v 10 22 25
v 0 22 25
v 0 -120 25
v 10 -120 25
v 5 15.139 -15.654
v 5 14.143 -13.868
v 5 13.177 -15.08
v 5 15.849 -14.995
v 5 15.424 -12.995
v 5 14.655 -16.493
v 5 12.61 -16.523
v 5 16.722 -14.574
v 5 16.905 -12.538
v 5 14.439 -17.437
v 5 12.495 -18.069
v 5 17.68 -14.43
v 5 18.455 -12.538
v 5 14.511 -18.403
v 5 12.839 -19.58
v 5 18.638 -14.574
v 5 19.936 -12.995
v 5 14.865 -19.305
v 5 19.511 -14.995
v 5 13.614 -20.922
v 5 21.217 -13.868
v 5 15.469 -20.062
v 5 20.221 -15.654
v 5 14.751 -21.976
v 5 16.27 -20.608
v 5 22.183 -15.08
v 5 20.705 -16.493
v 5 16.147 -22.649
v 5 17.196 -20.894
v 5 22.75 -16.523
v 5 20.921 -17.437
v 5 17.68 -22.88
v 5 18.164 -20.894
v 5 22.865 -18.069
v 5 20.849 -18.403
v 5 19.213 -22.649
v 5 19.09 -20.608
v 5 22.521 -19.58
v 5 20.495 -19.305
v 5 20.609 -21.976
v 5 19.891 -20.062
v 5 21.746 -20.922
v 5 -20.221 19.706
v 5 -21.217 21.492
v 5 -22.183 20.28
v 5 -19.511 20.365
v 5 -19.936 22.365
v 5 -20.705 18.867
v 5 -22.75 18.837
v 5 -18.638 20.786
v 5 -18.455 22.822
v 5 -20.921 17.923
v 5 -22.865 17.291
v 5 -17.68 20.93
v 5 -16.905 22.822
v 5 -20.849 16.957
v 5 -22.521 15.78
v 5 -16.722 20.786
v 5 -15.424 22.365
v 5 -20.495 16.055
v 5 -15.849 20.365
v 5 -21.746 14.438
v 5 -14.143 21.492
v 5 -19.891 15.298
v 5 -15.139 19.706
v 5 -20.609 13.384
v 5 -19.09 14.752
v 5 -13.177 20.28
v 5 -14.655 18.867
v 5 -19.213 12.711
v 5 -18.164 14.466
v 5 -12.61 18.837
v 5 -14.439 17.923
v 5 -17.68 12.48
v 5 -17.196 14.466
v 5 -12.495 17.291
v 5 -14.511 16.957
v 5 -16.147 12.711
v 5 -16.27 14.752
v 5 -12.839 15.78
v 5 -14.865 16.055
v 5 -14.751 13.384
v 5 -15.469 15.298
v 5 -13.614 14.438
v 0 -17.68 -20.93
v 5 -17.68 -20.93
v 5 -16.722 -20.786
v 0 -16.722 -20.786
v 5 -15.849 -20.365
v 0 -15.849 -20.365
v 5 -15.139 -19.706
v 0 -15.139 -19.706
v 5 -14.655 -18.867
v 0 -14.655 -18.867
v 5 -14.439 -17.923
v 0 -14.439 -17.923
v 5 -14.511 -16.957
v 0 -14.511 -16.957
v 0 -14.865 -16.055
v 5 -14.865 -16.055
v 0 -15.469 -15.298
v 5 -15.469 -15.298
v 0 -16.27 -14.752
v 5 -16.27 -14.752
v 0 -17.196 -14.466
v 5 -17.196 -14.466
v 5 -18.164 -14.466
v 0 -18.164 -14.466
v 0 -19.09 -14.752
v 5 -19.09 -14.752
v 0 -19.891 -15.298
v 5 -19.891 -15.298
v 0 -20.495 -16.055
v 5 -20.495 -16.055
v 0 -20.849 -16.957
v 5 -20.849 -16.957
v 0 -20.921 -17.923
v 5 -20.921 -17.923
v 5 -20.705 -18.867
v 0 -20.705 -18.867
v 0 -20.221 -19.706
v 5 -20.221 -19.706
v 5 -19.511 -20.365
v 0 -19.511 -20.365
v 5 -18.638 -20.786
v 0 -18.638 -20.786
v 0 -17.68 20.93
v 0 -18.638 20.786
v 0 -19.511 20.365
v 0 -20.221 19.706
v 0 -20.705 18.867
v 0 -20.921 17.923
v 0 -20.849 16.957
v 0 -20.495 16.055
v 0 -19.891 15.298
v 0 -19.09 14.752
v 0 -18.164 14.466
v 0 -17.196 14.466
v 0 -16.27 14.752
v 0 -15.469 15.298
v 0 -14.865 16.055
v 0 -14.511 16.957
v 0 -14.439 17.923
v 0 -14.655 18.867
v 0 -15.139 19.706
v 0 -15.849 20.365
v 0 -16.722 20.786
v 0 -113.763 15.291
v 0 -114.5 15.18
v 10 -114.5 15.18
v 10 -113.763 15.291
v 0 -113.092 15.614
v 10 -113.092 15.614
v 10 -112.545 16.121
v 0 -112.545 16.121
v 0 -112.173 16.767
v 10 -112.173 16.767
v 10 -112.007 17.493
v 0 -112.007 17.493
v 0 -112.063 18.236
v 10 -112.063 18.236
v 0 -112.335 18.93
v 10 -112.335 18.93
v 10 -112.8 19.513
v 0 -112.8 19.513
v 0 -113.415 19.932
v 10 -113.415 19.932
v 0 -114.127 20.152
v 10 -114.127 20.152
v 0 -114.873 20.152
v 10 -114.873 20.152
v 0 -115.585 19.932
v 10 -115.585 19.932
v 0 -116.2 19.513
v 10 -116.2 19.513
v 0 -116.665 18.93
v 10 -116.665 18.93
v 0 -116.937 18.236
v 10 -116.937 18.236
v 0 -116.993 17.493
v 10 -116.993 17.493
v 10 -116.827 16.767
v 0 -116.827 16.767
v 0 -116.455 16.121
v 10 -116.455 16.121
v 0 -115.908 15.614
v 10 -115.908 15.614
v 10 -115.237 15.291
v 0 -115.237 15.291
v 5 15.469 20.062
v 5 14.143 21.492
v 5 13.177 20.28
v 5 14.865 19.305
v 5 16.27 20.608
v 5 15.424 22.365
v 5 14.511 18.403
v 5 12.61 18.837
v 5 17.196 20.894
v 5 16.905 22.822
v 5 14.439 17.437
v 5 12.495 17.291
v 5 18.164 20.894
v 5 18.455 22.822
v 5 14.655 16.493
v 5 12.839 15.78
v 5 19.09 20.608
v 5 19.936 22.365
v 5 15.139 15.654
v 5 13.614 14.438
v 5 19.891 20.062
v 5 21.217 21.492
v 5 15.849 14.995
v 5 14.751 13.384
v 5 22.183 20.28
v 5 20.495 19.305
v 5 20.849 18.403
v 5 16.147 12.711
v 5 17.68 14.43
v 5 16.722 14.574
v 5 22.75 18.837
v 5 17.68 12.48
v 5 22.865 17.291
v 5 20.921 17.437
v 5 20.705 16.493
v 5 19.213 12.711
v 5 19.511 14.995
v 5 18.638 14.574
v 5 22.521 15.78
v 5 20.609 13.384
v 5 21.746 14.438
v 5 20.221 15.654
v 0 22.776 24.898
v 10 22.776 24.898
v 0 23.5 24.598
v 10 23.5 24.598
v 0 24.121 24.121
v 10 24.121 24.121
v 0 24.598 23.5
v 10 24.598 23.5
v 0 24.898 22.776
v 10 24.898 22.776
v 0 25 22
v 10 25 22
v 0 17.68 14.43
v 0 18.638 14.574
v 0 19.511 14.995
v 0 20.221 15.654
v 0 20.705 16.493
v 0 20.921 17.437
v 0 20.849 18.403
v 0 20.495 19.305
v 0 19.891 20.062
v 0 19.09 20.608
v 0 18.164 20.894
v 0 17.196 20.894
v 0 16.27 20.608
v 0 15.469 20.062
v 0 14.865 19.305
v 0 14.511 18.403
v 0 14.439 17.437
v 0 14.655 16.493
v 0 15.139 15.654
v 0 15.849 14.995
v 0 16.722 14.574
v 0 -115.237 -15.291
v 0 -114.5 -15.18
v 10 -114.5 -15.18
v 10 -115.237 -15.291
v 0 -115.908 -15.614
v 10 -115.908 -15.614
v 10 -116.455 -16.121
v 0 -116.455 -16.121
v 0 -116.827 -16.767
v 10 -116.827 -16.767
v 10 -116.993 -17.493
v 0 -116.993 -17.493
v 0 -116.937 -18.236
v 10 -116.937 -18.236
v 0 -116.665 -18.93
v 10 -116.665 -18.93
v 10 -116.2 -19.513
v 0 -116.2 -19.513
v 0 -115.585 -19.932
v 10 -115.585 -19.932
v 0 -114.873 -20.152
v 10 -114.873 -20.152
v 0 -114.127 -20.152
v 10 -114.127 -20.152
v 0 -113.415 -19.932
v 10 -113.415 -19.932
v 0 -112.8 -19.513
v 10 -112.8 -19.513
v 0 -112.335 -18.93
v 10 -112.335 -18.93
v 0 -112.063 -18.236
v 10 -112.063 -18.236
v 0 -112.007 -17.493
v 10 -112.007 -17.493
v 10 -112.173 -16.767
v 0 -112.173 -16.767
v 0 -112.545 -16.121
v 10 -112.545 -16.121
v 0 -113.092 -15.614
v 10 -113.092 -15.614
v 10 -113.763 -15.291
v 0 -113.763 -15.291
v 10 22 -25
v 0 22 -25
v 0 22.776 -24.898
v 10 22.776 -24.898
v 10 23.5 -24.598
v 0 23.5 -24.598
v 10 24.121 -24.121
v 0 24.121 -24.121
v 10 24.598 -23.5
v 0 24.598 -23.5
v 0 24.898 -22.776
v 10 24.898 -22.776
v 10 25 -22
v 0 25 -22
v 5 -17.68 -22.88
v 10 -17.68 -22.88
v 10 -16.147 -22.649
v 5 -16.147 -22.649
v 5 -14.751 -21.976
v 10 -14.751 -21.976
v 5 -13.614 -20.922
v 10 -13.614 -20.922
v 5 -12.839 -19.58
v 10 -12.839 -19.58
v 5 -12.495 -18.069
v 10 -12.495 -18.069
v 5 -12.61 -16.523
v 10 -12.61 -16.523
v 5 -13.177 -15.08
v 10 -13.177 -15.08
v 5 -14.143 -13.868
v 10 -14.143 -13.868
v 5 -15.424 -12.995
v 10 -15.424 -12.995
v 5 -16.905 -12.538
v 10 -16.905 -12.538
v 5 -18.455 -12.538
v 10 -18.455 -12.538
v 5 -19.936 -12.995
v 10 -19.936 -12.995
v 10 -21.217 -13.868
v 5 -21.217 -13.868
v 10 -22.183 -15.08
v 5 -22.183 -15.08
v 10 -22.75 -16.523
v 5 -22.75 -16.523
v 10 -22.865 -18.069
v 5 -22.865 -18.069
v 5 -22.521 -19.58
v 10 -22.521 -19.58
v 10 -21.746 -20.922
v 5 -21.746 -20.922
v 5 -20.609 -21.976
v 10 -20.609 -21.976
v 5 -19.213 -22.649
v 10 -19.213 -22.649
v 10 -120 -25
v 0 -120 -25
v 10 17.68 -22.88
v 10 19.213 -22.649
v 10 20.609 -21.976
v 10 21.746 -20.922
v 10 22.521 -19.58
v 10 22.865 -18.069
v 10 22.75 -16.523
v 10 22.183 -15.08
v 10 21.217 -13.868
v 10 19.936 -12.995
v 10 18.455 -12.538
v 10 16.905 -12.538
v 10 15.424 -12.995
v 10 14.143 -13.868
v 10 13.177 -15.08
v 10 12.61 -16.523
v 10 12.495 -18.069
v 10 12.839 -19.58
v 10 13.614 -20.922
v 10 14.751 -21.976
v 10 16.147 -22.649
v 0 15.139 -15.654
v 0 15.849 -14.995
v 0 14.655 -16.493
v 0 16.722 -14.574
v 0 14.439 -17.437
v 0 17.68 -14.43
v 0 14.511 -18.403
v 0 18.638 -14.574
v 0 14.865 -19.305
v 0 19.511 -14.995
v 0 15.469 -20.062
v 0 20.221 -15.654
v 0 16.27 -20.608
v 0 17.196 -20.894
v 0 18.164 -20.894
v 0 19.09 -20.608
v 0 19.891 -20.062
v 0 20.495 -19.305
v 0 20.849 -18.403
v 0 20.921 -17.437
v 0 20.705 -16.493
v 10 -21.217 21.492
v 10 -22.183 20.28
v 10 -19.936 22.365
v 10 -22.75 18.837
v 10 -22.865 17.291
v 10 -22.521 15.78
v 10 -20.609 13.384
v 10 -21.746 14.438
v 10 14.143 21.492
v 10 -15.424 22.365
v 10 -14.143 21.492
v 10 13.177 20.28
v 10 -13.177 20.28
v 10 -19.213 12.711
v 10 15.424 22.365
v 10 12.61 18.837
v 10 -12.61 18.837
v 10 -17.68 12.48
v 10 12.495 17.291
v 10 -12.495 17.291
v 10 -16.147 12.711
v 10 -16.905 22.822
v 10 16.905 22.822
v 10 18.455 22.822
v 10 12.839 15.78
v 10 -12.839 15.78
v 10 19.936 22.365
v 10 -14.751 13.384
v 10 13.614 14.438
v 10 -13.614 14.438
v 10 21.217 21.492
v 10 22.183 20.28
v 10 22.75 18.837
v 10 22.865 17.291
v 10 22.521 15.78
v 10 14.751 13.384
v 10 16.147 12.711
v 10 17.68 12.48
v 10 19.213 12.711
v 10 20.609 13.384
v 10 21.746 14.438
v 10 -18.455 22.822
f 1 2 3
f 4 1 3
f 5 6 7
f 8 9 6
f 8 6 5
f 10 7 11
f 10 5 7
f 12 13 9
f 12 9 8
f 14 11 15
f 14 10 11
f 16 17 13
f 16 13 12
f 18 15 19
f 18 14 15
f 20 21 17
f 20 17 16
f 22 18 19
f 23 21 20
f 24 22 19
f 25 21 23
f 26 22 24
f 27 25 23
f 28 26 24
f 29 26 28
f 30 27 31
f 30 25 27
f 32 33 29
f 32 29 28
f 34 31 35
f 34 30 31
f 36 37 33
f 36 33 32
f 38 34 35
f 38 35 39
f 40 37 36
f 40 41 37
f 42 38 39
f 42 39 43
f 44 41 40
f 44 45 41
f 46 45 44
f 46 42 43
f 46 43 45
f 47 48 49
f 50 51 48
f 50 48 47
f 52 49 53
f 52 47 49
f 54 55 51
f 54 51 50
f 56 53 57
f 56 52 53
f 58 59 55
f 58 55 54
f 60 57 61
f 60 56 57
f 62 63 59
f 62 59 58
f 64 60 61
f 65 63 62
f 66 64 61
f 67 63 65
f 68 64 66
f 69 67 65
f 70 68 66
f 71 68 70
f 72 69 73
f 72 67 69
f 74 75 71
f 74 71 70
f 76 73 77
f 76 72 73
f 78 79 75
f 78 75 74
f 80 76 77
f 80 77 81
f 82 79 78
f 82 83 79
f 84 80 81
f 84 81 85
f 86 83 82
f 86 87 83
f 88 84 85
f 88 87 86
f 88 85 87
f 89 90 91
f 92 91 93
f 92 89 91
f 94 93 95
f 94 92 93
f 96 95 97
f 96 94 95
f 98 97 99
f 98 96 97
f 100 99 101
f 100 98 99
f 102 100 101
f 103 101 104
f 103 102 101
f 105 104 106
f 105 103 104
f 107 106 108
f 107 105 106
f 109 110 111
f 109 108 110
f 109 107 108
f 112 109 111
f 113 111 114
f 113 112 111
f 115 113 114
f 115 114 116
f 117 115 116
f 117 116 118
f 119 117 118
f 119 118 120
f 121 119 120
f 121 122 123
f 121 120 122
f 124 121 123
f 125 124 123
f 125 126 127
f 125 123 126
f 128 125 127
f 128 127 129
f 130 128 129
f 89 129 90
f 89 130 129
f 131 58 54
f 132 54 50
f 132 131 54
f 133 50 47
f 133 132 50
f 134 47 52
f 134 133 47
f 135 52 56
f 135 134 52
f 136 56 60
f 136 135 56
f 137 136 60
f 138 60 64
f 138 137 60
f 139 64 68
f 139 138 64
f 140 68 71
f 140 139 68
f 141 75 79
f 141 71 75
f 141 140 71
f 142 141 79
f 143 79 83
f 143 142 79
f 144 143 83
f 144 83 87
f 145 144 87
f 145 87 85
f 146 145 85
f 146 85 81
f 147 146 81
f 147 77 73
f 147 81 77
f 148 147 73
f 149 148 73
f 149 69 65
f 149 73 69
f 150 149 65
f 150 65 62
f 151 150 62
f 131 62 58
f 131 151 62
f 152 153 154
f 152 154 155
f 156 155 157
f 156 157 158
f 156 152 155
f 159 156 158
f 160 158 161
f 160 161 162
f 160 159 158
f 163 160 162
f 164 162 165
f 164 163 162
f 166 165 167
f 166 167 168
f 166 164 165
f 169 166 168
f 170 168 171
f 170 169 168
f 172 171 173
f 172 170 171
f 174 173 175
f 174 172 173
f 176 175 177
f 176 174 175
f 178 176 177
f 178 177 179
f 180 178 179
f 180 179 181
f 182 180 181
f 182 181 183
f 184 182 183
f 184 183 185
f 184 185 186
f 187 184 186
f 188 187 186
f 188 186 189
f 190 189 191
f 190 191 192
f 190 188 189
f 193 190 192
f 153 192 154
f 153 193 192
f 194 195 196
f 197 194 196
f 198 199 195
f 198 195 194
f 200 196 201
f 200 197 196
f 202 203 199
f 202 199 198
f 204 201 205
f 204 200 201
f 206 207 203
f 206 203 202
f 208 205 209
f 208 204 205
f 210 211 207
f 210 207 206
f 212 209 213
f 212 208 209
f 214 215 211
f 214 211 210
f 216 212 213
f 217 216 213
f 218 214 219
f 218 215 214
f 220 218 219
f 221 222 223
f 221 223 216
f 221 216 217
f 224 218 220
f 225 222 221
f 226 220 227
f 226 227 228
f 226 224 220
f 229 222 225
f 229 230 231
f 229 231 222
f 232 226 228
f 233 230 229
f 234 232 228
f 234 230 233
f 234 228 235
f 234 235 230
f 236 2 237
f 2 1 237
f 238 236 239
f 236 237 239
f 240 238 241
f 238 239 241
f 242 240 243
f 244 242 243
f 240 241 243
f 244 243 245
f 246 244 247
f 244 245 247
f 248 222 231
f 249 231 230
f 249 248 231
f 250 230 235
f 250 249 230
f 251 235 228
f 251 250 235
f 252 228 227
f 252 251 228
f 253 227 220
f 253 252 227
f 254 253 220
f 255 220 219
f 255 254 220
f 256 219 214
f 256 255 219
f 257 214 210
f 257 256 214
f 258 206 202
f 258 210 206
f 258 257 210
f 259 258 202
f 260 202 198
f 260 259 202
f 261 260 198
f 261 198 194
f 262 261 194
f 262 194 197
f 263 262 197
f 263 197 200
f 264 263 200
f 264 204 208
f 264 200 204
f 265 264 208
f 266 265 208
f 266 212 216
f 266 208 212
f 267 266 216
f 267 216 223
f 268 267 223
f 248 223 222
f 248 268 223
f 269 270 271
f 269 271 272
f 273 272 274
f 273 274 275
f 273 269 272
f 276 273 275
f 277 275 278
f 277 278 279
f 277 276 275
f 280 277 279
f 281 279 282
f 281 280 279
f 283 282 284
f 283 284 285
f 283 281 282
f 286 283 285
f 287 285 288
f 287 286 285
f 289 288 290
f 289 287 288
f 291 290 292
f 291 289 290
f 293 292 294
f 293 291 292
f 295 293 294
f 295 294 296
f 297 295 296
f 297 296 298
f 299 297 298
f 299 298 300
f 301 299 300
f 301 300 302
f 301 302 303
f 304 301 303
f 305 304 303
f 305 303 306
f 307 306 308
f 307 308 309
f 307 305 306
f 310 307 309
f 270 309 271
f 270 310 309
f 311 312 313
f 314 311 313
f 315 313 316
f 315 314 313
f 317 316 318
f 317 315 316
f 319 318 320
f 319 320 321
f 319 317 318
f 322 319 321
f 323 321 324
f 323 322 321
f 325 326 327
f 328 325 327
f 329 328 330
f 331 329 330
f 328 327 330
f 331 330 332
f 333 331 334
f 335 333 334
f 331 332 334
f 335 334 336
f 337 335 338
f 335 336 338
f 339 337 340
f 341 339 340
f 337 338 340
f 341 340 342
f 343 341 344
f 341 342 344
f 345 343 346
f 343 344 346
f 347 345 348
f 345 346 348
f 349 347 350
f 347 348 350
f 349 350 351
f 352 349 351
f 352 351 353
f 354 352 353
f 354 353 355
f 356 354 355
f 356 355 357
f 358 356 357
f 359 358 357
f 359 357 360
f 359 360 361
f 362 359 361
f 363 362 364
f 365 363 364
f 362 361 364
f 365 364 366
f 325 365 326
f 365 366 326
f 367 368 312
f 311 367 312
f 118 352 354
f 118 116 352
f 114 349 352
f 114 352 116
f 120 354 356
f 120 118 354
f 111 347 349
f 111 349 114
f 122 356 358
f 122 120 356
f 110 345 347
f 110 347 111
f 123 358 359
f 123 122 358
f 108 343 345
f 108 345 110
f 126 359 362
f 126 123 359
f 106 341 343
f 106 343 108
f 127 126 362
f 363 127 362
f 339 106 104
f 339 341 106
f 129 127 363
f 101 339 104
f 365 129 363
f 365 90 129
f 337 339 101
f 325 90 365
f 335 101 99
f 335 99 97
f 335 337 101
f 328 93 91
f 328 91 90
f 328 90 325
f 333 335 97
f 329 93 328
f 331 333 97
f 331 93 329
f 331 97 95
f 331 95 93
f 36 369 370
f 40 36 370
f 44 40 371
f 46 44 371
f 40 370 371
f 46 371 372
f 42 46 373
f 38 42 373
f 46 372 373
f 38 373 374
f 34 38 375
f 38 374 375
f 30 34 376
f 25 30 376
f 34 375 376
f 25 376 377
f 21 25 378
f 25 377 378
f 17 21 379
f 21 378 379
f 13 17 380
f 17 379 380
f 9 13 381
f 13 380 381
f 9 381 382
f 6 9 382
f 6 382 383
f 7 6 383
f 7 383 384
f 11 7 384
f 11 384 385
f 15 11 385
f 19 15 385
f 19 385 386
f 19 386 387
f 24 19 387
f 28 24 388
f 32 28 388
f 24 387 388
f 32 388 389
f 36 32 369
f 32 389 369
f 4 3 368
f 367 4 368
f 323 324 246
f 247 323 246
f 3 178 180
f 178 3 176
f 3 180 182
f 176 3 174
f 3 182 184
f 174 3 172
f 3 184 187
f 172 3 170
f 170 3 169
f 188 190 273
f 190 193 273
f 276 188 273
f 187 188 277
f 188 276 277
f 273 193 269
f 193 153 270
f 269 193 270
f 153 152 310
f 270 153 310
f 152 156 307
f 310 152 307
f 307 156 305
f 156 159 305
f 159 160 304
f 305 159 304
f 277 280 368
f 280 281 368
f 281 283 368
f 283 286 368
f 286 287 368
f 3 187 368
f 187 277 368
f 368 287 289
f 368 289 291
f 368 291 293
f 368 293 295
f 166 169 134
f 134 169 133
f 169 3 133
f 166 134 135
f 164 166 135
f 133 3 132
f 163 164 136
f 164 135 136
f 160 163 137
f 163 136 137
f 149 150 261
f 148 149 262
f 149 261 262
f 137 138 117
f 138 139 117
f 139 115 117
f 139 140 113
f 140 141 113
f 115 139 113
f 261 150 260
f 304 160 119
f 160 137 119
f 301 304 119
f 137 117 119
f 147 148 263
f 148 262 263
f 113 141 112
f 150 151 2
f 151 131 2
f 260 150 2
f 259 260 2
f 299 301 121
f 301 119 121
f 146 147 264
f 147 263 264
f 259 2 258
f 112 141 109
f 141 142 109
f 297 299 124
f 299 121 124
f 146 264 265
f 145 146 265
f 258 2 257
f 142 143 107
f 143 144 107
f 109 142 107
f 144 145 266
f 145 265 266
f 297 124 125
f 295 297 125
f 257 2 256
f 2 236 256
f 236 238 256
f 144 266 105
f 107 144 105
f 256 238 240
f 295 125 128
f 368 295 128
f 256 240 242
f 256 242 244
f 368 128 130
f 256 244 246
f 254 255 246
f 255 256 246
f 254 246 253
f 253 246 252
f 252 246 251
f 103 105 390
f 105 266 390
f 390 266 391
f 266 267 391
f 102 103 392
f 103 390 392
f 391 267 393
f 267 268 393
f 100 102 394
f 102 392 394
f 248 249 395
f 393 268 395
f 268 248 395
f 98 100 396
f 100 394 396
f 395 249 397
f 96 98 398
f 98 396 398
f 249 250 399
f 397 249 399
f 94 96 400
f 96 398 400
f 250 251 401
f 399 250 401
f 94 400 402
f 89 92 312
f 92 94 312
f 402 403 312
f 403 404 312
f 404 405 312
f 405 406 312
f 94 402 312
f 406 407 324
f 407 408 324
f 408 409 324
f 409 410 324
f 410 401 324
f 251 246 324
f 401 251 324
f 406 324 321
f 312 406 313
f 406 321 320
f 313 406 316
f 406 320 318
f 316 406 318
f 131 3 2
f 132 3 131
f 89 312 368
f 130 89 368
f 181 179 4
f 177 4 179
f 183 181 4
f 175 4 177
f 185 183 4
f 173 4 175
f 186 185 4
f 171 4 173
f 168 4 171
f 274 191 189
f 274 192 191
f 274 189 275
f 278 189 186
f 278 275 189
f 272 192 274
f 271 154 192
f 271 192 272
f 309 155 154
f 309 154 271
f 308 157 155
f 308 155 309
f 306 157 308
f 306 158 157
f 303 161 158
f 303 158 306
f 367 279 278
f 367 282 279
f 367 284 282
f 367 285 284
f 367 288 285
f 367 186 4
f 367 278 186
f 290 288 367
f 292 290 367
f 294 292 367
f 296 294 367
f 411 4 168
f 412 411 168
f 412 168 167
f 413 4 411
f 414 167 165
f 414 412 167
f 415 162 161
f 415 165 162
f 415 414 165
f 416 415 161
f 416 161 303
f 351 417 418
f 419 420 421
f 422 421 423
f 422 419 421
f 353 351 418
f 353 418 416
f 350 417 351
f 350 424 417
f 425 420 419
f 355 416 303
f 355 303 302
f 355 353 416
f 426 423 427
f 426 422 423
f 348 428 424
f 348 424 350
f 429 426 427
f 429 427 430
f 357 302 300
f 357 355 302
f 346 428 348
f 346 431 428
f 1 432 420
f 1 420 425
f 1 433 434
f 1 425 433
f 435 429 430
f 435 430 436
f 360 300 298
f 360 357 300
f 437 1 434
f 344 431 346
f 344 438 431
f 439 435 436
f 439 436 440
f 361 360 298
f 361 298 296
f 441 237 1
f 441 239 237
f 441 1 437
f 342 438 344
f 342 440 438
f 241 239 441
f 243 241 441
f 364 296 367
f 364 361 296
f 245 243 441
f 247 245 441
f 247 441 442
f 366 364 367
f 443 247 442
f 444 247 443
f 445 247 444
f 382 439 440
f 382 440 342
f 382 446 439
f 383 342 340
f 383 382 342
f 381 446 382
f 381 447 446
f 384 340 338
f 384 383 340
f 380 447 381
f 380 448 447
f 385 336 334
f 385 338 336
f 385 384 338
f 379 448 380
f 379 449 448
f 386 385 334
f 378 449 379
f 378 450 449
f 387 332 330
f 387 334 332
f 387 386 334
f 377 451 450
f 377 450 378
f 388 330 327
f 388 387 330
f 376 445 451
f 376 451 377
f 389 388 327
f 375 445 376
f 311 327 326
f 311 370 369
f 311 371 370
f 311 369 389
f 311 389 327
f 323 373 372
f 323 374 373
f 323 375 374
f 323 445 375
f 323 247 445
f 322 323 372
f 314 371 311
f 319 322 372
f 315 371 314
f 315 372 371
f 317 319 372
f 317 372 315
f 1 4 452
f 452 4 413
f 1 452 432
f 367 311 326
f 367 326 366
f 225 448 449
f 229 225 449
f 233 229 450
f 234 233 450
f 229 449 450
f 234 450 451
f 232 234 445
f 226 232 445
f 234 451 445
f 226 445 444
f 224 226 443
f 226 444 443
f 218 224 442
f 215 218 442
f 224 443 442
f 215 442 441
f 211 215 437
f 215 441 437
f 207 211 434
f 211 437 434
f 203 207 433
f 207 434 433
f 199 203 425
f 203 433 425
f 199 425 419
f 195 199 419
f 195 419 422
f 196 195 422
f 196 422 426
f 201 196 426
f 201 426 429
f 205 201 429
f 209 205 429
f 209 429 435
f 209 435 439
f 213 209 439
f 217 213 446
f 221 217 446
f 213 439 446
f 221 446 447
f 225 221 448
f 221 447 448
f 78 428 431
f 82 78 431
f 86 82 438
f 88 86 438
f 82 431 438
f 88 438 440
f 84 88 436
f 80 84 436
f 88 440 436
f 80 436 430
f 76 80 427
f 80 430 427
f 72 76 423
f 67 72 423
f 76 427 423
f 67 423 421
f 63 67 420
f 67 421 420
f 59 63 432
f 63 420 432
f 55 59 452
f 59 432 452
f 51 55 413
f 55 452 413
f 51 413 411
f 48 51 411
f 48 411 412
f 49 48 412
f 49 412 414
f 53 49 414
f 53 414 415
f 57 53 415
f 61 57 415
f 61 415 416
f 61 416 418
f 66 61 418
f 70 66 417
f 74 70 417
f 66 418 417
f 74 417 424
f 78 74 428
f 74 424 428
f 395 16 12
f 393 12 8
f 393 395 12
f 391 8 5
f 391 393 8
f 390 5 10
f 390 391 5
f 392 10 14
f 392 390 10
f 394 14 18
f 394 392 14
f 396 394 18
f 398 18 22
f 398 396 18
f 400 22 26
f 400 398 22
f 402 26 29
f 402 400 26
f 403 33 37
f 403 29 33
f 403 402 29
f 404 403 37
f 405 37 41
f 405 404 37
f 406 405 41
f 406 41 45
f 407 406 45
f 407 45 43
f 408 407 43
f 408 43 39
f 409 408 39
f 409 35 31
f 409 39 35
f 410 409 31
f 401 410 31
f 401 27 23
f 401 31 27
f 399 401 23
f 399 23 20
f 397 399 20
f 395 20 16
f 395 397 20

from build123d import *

# Parameters (mm, degrees)
CROQUIS1_R              = 3.25
CROQUIS1_R_2            = 2.5
SALIENTE_EXTRUIR1_DEPTH = 10
CROQUIS5_R              = 5.2
CORTAR_EXTRUIR2_DEPTH   = 5
FILLET1_R               = 3


with BuildPart() as part:
    # Croquis1 → Saliente-Extruir1 (new body)
    with BuildSketch(Plane(origin=(0, 0, 0), x_dir=(0, 0, -1), z_dir=(1, 0, 0))):
        Polygon((-25, -120), (25, -120), (25, 25), (0, 25), (-25, 25), (-25, 0), align=None)
        with Locations((-17.68, 17.68)):
            Circle(CROQUIS1_R, mode=Mode.SUBTRACT)
        with Locations(Location((17.68, 17.68, 0), (0, 0, 180))):
            Circle(CROQUIS1_R, mode=Mode.SUBTRACT)
        with Locations((17.68, -17.68)):
            Circle(CROQUIS1_R, mode=Mode.SUBTRACT)
        with Locations(Location((-17.68, -17.68, 0), (0, 0, 180))):
            Circle(CROQUIS1_R, mode=Mode.SUBTRACT)
        with Locations((-17.68, -114.5)):
            Circle(CROQUIS1_R_2, mode=Mode.SUBTRACT)
        with Locations(Location((17.68, -114.5, 0), (0, 0, 180))):
            Circle(CROQUIS1_R_2, mode=Mode.SUBTRACT)
    extrude(amount=SALIENTE_EXTRUIR1_DEPTH)

    # Croquis5 → Cortar-Extruir2 (cut)
    with BuildSketch(Plane(origin=(10, 0, 0), x_dir=(0, 0, -1), z_dir=(1, 0, 0))):
        with Locations((17.68, 17.68)):
            Circle(CROQUIS5_R)
        with Locations((-17.68, 17.68)):
            Circle(CROQUIS5_R)
        with Locations((-17.68, -17.68)):
            Circle(CROQUIS5_R)
        with Locations((17.68, -17.68)):
            Circle(CROQUIS5_R)
    extrude(amount=-CORTAR_EXTRUIR2_DEPTH, mode=Mode.SUBTRACT)

    # Fillet1
    fillet1_edges = [part.edges().sort_by_distance(p)[0] for p in [
        (5, 25, -25),
        (5, 25, 25),
    ]]
    fillet(fillet1_edges, radius=FILLET1_R)


solid = part.part
